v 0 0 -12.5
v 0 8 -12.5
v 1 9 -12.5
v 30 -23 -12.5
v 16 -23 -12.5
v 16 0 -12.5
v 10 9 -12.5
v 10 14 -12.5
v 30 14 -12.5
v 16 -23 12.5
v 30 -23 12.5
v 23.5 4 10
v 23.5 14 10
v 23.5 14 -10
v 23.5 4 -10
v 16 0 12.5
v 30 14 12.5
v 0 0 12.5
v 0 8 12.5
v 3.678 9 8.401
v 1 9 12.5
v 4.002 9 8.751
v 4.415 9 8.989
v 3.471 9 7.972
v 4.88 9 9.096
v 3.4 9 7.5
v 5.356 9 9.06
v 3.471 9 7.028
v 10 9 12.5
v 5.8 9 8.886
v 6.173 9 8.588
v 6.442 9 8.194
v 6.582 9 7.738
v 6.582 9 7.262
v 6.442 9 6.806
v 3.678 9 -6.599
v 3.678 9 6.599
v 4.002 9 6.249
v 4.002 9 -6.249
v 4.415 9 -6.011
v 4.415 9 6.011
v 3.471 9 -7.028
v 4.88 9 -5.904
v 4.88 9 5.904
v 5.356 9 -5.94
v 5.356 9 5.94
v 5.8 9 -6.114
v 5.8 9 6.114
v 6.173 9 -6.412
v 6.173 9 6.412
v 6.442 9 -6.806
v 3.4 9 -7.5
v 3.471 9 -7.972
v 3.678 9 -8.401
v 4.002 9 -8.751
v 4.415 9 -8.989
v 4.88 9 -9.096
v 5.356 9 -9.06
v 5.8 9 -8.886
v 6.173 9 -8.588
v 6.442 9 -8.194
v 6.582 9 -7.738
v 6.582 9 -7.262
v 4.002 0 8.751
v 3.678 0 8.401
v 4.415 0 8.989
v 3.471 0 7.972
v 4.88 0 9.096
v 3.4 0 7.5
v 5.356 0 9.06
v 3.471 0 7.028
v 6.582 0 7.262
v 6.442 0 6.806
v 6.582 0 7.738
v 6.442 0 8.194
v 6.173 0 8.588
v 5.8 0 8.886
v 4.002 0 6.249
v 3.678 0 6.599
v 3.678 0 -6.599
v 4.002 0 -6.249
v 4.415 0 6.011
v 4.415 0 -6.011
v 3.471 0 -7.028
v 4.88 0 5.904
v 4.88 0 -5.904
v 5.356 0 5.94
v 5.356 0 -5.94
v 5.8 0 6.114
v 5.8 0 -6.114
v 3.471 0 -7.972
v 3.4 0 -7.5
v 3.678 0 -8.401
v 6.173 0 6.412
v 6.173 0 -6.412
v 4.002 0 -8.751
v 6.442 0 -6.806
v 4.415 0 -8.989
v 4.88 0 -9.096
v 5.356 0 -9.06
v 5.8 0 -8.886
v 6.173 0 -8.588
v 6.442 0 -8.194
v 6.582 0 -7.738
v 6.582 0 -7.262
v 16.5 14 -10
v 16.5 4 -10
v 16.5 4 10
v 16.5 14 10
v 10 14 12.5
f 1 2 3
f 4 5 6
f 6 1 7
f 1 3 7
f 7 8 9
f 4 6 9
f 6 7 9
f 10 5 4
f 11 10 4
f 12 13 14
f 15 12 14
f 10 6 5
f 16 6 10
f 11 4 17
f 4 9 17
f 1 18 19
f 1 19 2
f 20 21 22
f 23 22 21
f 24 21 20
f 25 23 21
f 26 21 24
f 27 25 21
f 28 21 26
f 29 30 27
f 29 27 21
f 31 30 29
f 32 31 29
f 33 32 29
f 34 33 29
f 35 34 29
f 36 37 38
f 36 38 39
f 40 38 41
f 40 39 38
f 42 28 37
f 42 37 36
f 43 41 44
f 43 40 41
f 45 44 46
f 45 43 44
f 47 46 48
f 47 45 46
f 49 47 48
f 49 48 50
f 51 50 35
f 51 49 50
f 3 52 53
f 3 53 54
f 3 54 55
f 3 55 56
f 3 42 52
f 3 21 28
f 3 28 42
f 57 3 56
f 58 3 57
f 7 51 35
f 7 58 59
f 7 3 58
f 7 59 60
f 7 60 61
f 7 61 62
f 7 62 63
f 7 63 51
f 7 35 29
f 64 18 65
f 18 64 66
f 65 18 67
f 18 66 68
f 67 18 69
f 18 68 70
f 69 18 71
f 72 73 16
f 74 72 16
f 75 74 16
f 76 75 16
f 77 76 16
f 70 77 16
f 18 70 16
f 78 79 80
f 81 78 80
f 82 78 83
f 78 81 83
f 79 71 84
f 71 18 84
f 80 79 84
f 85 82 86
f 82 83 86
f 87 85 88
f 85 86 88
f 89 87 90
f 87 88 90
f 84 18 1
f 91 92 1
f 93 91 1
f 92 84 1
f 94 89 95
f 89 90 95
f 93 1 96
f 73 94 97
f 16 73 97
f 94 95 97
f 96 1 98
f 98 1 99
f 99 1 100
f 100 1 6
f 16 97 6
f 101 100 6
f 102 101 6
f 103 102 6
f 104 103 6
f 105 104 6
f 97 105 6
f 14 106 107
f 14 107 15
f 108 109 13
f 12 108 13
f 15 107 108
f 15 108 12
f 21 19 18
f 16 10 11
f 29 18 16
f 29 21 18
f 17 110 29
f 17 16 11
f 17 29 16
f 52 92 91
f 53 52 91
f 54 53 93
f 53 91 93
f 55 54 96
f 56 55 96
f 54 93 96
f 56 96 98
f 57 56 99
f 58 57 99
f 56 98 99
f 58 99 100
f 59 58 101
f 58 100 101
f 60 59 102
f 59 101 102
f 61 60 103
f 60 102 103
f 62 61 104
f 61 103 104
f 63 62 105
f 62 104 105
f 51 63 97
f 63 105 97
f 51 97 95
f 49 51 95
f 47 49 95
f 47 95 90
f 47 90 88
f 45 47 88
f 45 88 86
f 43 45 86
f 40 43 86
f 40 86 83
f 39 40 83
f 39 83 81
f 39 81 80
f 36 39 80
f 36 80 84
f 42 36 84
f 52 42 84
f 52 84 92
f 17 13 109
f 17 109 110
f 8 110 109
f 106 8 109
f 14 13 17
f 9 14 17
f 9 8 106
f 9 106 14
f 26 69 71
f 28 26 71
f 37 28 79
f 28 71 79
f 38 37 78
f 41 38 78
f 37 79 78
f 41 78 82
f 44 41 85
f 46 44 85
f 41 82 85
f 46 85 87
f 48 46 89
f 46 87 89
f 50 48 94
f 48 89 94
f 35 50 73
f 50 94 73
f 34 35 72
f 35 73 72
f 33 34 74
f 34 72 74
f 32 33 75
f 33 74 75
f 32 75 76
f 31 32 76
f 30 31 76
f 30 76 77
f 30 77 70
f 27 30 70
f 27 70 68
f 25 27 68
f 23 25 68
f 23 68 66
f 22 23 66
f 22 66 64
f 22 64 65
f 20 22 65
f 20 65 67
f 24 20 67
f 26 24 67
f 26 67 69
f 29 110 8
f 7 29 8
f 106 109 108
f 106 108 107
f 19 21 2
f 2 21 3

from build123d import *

# Parameters (mm, degrees)
SKETCH1_W                  = 30
SKETCH1_H                  = 25
BOSS_EXTRUDE1_DEPTH        = 14
F_3_2_3_2_DIAMETER_HOLE1_D = 3.2
SKETCH5_W                  = 7
SKETCH5_H                  = 20
CUT_EXTRUDE1_DEPTH         = 10
SKETCH6_W                  = 10
SKETCH6_H                  = 25
CUT_EXTRUDE2_DEPTH         = 5
CHAMFER1_SIZE              = 1
SKETCH7_W                  = 14
SKETCH7_H                  = 25
BOSS_EXTRUDE2_DEPTH        = 23


with BuildPart() as part:
    # Sketch1 → Boss-Extrude1 (new body)
    with BuildSketch(Plane(origin=(0, 0, 0), x_dir=(1, 0, 0), z_dir=(0, 1, 0))):
        with Locations((15, 0)):
            Rectangle(SKETCH1_W, SKETCH1_H)
    extrude(amount=BOSS_EXTRUDE1_DEPTH)

    # Ø3.2 (3.2) Diameter Hole1 (through all)
    with Locations(Plane(origin=(0, 14, 0), x_dir=(1, 0, 0), z_dir=(0, 1, 0))):
        with Locations((5, 7.5), (5, -7.5)):
            Hole(F_3_2_3_2_DIAMETER_HOLE1_D / 2)

    # Sketch5 → Cut-Extrude1 (cut)
    with BuildSketch(Plane(origin=(0, 14, 0), x_dir=(1, 0, 0), z_dir=(0, 1, 0))):
        with Locations((20, 0)):
            Rectangle(SKETCH5_W, SKETCH5_H)
    extrude(amount=-CUT_EXTRUDE1_DEPTH, mode=Mode.SUBTRACT)

    # Sketch6 → Cut-Extrude2 (cut)
    with BuildSketch(Plane(origin=(0, 14, 0), x_dir=(1, 0, 0), z_dir=(0, 1, 0))):
        with Locations((5, 0)):
            Rectangle(SKETCH6_W, SKETCH6_H)
    extrude(amount=-CUT_EXTRUDE2_DEPTH, mode=Mode.SUBTRACT)

    # Chamfer1
    chamfer1_edges = [part.edges().sort_by_distance(p)[0] for p in [
        (0, 9, 0),
    ]]
    chamfer(chamfer1_edges, length=CHAMFER1_SIZE)

    # Sketch7 → Boss-Extrude2 (add)
    with BuildSketch(Plane.XZ):
        with Locations((23, 0)):
            Rectangle(SKETCH7_W, SKETCH7_H)
    extrude(amount=BOSS_EXTRUDE2_DEPTH)


solid = part.part
